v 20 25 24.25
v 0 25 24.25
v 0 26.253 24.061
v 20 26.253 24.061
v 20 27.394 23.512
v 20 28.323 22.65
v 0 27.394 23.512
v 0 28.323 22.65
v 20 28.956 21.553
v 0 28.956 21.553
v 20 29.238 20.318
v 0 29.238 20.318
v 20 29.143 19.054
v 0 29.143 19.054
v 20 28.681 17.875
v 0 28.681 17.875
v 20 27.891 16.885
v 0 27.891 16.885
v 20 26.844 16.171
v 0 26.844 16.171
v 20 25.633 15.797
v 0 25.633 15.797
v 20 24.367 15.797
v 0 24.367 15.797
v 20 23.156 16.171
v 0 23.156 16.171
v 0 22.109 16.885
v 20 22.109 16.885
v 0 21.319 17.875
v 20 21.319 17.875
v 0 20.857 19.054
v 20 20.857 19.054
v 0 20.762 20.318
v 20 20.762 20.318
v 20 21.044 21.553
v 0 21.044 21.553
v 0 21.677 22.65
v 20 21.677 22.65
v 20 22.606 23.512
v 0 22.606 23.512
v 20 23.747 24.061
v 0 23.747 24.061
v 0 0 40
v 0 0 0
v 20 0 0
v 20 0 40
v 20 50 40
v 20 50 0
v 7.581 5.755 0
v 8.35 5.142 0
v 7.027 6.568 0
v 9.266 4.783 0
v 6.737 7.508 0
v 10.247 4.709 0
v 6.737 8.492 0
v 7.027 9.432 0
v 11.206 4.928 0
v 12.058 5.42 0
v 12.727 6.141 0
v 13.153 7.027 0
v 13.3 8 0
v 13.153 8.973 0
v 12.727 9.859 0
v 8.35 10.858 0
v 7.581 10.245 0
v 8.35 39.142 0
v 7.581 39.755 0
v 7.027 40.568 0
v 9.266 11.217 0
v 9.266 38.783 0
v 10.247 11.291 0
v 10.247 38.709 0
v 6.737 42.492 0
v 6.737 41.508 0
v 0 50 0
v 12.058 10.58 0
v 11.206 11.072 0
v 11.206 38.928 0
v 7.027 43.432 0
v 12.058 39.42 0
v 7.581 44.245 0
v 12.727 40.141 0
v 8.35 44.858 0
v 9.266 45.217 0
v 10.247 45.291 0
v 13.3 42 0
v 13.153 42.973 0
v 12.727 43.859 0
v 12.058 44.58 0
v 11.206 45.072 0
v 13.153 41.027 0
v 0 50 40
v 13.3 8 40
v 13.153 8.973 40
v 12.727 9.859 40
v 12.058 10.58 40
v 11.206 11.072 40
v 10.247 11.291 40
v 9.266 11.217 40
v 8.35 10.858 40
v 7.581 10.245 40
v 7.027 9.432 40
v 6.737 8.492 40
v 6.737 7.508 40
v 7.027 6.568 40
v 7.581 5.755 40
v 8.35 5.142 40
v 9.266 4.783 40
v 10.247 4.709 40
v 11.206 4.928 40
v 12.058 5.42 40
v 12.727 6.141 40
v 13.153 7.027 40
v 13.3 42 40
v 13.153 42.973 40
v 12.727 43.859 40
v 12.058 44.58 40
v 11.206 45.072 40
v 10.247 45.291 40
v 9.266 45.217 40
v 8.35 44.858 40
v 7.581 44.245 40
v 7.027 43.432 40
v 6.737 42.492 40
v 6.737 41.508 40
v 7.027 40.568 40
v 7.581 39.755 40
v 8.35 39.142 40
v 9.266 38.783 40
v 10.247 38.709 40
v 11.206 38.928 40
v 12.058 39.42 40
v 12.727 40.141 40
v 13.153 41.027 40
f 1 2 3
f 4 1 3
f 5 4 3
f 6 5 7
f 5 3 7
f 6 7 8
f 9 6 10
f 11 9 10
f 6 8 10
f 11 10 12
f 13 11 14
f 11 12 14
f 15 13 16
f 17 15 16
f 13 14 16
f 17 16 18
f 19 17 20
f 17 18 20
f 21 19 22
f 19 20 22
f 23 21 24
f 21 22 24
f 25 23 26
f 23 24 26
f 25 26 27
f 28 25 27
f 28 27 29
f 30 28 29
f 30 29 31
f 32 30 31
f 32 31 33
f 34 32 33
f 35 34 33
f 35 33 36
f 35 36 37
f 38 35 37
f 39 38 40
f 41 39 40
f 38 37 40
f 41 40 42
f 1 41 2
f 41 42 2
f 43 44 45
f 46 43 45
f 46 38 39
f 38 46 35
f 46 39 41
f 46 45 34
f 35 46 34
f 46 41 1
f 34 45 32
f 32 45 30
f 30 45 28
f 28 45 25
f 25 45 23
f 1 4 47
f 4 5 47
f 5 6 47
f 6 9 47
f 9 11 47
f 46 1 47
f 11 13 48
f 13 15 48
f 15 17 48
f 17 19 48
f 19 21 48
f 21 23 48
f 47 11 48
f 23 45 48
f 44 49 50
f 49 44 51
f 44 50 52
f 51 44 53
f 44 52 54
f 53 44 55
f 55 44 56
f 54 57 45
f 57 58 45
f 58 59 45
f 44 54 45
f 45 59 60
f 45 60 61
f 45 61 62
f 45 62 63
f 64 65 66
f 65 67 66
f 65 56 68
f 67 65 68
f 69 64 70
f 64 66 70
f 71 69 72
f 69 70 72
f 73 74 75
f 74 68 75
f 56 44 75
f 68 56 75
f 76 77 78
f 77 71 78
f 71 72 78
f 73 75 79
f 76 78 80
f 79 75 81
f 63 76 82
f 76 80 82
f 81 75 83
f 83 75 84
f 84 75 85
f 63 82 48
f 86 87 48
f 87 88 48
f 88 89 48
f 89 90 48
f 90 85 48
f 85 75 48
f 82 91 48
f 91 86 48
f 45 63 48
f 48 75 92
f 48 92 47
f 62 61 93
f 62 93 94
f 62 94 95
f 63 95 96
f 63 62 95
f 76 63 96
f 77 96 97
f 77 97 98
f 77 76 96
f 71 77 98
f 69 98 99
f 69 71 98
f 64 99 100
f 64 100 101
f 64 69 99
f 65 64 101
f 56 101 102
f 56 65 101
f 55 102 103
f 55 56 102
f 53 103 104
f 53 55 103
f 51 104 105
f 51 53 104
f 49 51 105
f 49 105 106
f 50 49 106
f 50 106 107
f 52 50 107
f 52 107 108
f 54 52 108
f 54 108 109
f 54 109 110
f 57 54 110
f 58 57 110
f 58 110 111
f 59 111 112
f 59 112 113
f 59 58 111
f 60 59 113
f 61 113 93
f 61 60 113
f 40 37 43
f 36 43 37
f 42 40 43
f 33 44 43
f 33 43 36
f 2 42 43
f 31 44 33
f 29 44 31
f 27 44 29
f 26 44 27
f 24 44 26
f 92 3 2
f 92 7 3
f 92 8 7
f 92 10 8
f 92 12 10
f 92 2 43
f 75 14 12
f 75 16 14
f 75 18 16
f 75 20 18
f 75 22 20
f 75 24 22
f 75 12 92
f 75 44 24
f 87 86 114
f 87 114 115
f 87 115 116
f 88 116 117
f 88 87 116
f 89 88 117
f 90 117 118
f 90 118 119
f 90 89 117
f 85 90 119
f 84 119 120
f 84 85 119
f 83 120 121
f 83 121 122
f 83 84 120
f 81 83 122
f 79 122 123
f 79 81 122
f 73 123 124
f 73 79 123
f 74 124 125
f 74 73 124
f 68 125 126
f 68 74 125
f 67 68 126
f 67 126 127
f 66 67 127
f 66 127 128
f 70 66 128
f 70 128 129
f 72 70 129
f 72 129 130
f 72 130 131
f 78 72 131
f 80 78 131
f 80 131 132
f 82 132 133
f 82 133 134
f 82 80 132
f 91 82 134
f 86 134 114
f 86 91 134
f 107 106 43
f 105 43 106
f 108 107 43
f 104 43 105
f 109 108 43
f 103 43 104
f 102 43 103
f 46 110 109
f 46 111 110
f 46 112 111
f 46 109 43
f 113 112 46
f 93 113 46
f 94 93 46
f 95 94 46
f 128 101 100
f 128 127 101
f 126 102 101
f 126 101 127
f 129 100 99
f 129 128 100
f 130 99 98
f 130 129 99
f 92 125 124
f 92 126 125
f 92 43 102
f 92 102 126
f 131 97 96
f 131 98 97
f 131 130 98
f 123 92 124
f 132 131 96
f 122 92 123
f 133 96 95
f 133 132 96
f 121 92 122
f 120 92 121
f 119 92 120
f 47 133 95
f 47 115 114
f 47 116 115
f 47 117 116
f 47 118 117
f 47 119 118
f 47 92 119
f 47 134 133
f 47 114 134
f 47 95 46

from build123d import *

# Parameters (mm, degrees)
SKETCH_1_W                   = 20
SKETCH_1_H                   = 50
SKETCH_1_R                   = 3.3
SCREW_BRACKET_20X50X40_DEPTH = 40
SKETCH_2_R                   = 4.25
M10_TAP_PILOT_8P5_DEPTH      = 20


with BuildPart() as part:
    # 草图1 → Screw_bracket_20x50x40 (new body)
    with BuildSketch(Plane.XY):
        with Locations((10, 25)):
            Rectangle(SKETCH_1_W, SKETCH_1_H)
        with Locations((10, 8)):
            Circle(SKETCH_1_R, mode=Mode.SUBTRACT)
        with Locations((10, 42)):
            Circle(SKETCH_1_R, mode=Mode.SUBTRACT)
    extrude(amount=SCREW_BRACKET_20X50X40_DEPTH)

    # 草图2 → M10_tap_pilot_8p5 (cut)
    with BuildSketch(Plane.ZY):
        with Locations((20, 25)):
            Circle(SKETCH_2_R)
    extrude(amount=-M10_TAP_PILOT_8P5_DEPTH, mode=Mode.SUBTRACT)


solid = part.part
